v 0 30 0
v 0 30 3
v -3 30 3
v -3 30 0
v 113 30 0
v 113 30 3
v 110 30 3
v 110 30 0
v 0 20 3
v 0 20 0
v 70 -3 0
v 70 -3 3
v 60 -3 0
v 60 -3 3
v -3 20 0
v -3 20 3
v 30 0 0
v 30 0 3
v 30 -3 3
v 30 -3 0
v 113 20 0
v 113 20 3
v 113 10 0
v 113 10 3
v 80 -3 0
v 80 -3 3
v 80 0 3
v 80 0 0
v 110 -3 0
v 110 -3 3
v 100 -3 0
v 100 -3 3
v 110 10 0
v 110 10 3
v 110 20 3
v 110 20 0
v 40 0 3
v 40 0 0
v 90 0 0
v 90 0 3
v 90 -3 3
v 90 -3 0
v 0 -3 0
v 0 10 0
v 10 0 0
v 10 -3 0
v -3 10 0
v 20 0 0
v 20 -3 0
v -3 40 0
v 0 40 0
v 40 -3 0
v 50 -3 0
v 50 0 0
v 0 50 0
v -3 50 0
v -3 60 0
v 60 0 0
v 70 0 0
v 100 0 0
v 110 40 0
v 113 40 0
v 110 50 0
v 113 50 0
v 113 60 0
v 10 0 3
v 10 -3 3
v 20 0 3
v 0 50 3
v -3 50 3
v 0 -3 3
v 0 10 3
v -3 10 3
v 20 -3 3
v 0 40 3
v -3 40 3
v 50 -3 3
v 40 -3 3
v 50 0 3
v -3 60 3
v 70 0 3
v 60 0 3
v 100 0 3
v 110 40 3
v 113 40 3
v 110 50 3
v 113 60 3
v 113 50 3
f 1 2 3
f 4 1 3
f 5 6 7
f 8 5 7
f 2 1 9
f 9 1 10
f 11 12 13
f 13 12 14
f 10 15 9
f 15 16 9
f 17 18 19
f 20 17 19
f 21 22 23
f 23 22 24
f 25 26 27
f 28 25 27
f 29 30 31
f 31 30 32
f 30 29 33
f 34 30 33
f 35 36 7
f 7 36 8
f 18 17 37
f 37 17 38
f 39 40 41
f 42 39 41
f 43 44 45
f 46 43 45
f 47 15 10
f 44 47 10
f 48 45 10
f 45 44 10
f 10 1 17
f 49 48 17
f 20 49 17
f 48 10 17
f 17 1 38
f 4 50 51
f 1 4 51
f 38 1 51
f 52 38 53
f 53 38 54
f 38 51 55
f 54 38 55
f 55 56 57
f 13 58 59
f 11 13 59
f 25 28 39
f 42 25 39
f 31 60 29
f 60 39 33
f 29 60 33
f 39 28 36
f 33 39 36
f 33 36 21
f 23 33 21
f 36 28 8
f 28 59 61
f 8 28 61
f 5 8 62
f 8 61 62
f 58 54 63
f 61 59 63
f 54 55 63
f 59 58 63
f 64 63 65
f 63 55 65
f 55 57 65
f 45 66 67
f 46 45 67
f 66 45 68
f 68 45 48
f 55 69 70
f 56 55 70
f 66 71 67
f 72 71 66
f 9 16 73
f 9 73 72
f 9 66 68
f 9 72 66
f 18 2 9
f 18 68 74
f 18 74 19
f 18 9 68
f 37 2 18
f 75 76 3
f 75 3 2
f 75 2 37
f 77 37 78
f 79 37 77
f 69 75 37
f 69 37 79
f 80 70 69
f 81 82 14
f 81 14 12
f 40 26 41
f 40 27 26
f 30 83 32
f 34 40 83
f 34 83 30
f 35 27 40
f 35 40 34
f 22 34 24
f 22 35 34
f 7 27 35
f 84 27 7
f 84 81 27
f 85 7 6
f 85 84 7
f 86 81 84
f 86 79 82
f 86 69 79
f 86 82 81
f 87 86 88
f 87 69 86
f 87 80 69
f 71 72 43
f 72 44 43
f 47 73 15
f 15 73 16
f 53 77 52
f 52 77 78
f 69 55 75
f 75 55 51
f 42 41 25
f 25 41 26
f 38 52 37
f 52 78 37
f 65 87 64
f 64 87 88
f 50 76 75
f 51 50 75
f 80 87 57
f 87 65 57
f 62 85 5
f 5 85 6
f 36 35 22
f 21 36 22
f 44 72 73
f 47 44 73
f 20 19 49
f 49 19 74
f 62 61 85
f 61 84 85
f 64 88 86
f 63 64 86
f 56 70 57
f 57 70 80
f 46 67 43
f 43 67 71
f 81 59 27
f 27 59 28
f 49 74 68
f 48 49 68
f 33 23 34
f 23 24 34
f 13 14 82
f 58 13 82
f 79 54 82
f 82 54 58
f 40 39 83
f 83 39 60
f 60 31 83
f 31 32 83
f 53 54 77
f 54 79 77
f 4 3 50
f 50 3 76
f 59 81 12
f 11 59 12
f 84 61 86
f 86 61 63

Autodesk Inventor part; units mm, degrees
ref_plane "YZ Plane" through (0, 0, 0) normal (1, 0, 0) x (0, 1, 0)
ref_plane "XZ Plane" through (0, 0, 0) normal (0, 1, 0) x (-1, 0, 0)
ref_plane "XY Plane" through (0, 0, 0) normal (0, 0, 1) x (1, 0, 0)
sketch "Sketch1" plane through (0, 0, 0) normal (0, 0, 1) x (1, 0, 0)
  line L0 (0, 0) -> (110, 0)
  line L1 (110, 0) -> (110, 60)
  line L2 (110, 60) -> (0, 60)
  line L3 (0, 60) -> (0, 0)
  dimension "d0" = 60
  dimension "d1" = 110
extrude "Extrusion1" add sketch "Sketch1" along normal blind 3
sketch "Sketch2" plane through (0, 0, 3) normal (0, 0, 1) x (1, 0, 0)
  line L0 (0, 0) -> (110, 0) projected
  line L1 (0, 0) -> (10, 0)
  line L2 (10, 0) -> (10, -3)
  line L3 (10, -3) -> (0, -3)
  line L4 (0, -3) -> (0, 0)
  line L5 (20, 0) -> (30, 0)
  line L6 (30, 0) -> (30, -3)
  line L7 (30, -3) -> (20, -3)
  line L8 (20, -3) -> (20, 0)
  line L9 (40, 0) -> (50, 0)
  line L10 (50, 0) -> (50, -3)
  line L11 (50, -3) -> (40, -3)
  line L12 (40, -3) -> (40, 0)
  line L13 (60, 0) -> (70, 0)
  line L14 (70, 0) -> (70, -3)
  line L15 (70, -3) -> (60, -3)
  line L16 (60, -3) -> (60, 0)
  line L17 (80, 0) -> (90, 0)
  line L18 (90, 0) -> (90, -3)
  line L19 (90, -3) -> (80, -3)
  line L20 (80, -3) -> (80, 0)
  line L21 (100, 0) -> (110, 0)
  line L22 (110, 0) -> (110, -3)
  line L23 (110, -3) -> (100, -3)
  line L24 (100, -3) -> (100, 0)
  line L25 (0, 60) -> (0, 0) construction
  dimension "d4" = 10
  dimension "d5" = 3
  dimension "d8" = 20
extrude "Extrusion2" add sketch "Sketch2" against normal blind 3
sketch "Sketch3" plane through (0, 0, 3) normal (0, 0, 1) x (1, 0, 0)
  line L0 (-3, 20) -> (0, 20)
  line L1 (0, 20) -> (0, 10)
  line L2 (0, 10) -> (-3, 10)
  line L3 (-3, 10) -> (-3, 20)
  line L4 (0, 63) -> (0, -3) construction
  line L5 (10, 0) -> (20, 0) construction
  line L6 (-3, 40) -> (0, 40)
  line L7 (0, 40) -> (0, 30)
  line L8 (0, 30) -> (-3, 30)
  line L9 (-3, 30) -> (-3, 40)
  line L10 (-3, 60) -> (0, 60)
  line L11 (0, 60) -> (0, 50)
  line L12 (0, 50) -> (-3, 50)
  line L13 (-3, 50) -> (-3, 60)
  line L14 (110, 20) -> (113, 20)
  line L15 (113, 20) -> (113, 10)
  line L16 (113, 10) -> (110, 10)
  line L17 (110, 10) -> (110, 20)
  line L18 (110, 40) -> (113, 40)
  line L19 (113, 40) -> (113, 30)
  line L20 (113, 30) -> (110, 30)
  line L21 (110, 30) -> (110, 40)
  line L22 (110, 60) -> (113, 60)
  line L23 (113, 60) -> (113, 50)
  line L24 (113, 50) -> (110, 50)
  line L25 (110, 50) -> (110, 60)
  point P0 (0, 0)
  dimension "d16" = 3
  dimension "d17" = 10
  dimension "d18" = 10
  dimension "d21" = 20
  dimension "d24" = 113
extrude "Extrusion3" add sketch "Sketch3" against normal blind 3
properties part number "portada"
